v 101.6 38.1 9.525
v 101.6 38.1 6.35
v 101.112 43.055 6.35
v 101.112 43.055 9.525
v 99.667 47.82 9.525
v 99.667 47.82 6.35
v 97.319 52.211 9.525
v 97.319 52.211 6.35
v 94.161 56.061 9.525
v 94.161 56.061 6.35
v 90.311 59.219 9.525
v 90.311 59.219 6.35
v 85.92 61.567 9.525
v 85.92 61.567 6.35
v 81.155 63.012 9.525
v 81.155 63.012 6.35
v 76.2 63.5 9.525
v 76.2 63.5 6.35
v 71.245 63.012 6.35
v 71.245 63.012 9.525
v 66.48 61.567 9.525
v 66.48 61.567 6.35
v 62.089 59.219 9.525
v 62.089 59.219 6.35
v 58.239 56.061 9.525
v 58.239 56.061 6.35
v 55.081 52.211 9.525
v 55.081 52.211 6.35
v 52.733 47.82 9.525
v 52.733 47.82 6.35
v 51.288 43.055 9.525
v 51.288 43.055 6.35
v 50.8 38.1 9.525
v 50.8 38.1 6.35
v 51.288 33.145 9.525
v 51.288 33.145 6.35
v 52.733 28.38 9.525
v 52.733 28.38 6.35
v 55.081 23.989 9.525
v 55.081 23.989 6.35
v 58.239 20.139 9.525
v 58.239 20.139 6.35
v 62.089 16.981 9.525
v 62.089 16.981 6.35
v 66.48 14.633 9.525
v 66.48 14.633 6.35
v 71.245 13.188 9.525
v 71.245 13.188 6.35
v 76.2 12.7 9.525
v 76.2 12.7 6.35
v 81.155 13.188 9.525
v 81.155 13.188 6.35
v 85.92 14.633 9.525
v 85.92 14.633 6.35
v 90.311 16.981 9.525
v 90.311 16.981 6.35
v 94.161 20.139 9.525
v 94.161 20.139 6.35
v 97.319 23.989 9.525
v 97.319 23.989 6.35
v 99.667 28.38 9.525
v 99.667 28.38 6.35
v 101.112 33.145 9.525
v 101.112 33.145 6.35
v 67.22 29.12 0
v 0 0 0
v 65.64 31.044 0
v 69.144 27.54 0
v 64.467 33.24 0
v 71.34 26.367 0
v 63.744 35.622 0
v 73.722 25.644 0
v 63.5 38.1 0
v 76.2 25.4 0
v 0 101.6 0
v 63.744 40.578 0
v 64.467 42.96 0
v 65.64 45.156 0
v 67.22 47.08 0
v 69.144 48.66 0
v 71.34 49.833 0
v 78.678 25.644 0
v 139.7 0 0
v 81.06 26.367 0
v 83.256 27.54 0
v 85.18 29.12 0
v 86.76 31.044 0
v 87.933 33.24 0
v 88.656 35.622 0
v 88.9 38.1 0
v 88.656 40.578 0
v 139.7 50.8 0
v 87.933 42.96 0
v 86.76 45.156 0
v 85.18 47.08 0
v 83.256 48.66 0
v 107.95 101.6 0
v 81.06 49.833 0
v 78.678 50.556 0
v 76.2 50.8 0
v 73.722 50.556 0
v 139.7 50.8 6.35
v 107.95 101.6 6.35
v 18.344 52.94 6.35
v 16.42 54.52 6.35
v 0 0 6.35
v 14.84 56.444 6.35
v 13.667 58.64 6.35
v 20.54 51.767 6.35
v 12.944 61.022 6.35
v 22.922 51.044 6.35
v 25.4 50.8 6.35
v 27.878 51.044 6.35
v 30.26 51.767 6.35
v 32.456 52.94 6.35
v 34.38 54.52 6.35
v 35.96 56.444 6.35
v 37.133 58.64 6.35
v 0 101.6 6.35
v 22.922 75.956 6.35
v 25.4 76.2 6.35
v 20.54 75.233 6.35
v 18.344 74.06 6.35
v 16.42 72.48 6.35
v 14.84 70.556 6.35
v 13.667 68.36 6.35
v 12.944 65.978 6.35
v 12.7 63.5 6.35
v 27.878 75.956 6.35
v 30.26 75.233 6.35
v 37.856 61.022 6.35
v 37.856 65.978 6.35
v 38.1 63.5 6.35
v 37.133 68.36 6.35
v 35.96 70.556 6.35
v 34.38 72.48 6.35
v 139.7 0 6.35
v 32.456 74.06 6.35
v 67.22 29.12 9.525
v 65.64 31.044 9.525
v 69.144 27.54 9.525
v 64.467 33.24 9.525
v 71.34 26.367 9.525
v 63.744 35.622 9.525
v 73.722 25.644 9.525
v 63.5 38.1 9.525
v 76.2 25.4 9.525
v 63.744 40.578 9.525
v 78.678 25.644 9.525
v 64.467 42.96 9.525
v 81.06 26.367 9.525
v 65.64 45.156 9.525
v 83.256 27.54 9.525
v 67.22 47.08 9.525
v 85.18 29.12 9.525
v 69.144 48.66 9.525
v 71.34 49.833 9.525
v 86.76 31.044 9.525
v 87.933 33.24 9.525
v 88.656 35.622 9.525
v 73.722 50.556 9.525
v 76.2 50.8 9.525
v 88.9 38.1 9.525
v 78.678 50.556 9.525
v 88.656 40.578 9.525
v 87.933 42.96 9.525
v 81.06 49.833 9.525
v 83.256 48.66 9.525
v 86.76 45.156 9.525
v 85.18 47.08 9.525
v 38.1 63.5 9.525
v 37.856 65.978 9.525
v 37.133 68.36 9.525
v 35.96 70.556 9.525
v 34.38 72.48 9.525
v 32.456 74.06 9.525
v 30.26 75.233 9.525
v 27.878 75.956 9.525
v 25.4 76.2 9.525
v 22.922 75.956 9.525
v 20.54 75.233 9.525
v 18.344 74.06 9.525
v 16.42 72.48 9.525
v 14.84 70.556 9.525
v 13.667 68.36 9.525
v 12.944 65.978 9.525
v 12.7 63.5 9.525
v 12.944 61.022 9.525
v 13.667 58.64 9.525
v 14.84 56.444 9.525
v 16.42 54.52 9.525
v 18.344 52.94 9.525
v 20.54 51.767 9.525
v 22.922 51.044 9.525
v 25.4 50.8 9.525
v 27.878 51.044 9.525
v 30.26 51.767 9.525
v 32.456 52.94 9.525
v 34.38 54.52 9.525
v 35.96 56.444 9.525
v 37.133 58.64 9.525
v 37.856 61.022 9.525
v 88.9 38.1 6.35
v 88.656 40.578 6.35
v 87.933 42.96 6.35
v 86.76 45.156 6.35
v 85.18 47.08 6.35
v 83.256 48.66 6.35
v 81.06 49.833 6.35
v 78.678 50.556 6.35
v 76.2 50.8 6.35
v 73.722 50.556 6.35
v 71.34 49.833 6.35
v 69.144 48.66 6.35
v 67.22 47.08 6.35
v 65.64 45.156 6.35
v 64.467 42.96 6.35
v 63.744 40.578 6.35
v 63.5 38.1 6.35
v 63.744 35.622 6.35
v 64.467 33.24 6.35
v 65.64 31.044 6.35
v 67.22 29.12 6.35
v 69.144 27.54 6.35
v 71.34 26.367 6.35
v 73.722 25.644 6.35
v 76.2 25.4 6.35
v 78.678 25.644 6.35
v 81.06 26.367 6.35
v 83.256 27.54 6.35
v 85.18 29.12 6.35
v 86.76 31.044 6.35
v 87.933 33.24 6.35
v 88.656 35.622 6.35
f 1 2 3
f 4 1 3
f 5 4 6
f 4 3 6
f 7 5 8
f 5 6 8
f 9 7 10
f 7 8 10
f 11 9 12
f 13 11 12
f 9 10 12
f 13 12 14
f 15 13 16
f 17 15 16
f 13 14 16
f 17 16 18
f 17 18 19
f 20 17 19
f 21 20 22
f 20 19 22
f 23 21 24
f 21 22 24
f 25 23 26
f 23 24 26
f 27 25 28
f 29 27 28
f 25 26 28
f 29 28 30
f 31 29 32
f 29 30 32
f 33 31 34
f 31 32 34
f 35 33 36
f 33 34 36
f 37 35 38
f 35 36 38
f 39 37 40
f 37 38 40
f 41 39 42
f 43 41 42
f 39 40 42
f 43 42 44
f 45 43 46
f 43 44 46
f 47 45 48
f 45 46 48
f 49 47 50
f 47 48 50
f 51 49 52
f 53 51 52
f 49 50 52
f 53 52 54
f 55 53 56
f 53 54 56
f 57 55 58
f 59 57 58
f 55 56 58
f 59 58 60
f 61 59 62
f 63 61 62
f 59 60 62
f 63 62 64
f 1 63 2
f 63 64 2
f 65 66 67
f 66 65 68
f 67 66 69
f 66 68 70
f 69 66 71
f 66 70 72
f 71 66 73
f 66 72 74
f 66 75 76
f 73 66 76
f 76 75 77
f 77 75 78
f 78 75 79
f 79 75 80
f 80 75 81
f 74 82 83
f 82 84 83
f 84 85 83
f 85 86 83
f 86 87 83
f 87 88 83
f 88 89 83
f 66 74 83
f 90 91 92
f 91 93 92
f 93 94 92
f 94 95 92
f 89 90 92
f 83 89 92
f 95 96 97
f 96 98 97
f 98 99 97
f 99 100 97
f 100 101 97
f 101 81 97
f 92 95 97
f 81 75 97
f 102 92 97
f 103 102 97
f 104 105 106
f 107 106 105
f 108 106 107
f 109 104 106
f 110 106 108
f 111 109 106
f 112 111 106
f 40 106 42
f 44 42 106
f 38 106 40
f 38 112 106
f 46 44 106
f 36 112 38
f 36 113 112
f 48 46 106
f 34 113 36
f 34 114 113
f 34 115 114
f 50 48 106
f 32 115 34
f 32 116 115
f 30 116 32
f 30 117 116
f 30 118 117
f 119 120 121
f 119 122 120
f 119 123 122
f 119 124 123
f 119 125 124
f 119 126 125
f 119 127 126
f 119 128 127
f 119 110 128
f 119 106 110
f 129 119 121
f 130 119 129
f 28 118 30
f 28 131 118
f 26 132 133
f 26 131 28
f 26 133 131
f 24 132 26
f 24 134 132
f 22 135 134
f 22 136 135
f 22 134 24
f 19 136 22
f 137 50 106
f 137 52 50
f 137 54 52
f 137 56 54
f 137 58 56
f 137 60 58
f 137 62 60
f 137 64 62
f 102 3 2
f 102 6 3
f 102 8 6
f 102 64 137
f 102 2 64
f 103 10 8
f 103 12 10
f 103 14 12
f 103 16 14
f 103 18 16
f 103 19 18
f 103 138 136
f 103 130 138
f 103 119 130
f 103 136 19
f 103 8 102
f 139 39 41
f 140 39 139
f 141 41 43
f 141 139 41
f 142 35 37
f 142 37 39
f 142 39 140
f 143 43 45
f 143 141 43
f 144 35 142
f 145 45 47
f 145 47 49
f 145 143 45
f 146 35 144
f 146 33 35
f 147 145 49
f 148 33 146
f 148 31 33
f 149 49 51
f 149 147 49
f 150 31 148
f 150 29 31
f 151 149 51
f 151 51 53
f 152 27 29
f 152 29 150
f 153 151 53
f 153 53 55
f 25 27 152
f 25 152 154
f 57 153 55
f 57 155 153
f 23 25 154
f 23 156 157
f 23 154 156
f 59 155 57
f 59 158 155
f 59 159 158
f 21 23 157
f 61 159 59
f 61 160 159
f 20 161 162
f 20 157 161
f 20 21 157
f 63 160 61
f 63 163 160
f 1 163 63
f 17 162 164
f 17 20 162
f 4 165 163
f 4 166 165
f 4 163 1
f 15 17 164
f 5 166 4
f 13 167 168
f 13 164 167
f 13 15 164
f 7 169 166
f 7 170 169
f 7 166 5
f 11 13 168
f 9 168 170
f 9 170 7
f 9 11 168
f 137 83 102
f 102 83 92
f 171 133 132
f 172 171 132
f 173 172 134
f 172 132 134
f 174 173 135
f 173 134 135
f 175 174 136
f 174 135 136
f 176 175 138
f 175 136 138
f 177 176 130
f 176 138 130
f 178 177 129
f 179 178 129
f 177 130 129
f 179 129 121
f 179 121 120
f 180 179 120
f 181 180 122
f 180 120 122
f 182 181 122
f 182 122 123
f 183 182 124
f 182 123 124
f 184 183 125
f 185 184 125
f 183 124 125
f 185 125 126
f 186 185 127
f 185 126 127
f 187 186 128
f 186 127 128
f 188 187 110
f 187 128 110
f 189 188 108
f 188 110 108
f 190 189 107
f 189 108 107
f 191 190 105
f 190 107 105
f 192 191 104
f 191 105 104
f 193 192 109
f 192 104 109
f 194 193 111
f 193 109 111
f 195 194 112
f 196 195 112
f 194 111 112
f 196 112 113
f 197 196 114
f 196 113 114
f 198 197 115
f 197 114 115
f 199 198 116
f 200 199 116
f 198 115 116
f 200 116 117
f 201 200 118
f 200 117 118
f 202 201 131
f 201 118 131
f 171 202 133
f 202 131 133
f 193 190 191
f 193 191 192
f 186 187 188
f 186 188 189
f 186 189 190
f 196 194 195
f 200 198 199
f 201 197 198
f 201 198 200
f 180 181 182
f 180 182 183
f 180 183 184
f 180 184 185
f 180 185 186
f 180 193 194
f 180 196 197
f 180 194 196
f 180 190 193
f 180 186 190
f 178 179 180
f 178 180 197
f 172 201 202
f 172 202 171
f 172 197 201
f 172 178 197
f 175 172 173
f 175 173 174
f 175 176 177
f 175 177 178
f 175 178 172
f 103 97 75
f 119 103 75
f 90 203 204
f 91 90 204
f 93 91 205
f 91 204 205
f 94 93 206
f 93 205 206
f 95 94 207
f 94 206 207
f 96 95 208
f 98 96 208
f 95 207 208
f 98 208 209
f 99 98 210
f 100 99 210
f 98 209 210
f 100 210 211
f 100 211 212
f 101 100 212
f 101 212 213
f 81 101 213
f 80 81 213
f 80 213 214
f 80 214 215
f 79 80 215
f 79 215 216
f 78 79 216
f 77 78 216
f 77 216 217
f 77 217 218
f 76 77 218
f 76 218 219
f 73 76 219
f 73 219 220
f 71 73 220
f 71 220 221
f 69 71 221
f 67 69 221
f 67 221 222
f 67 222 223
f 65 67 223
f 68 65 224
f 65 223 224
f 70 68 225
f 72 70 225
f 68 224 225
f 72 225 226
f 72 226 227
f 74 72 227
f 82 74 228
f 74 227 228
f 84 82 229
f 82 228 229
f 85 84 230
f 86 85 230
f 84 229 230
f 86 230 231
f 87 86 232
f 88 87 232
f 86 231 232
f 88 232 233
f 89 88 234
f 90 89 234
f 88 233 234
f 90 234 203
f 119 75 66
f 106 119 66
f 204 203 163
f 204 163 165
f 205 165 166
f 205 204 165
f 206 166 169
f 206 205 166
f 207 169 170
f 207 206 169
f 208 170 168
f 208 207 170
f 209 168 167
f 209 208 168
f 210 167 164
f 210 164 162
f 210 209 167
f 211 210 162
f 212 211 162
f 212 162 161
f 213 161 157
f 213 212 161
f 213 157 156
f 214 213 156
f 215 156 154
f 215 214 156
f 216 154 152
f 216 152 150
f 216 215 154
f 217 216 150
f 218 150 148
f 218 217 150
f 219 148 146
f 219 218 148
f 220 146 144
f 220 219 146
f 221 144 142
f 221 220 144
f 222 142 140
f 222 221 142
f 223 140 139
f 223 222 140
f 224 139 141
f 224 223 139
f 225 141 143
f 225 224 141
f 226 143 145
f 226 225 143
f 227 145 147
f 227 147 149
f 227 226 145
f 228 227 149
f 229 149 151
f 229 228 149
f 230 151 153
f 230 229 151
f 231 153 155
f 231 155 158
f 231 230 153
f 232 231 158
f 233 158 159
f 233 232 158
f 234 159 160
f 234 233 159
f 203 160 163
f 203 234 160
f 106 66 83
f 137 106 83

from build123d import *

# Parameters (mm, degrees)
BOSS_EXTRUDE2_DEPTH = 6.35
SKETCH2_R           = 12.7
SKETCH2_R_2         = 25.4
BOSS_EXTRUDE4_DEPTH = 3.175
SKETCH5_R           = 12.7
CUT_EXTRUDE1_DEPTH  = 127


with BuildPart() as part:
    # Sketch1 → Boss-Extrude2 (new body)
    with BuildSketch(Plane.XY):
        Polygon((0, 0), (139.7, 0), (139.7, 50.8), (107.95, 101.6), (0, 101.6), align=None)
    extrude(amount=BOSS_EXTRUDE2_DEPTH)

    # Sketch2 → Boss-Extrude4 (add)
    with BuildSketch(Plane.XY.offset(6.35)):
        with Locations((25.4, 63.5)):
            Circle(SKETCH2_R)
        with Locations((76.2, 38.1)):
            Circle(SKETCH2_R_2)
        with Locations((76.2, 38.1)):
            Circle(SKETCH2_R, mode=Mode.SUBTRACT)
    extrude(amount=BOSS_EXTRUDE4_DEPTH)

    # Sketch5 → Cut-Extrude1 (cut)
    with BuildSketch(Plane.XY.offset(6.35)):
        with Locations((76.2, 38.1)):
            Circle(SKETCH5_R)
    extrude(amount=-CUT_EXTRUDE1_DEPTH, mode=Mode.SUBTRACT)


solid = part.part
